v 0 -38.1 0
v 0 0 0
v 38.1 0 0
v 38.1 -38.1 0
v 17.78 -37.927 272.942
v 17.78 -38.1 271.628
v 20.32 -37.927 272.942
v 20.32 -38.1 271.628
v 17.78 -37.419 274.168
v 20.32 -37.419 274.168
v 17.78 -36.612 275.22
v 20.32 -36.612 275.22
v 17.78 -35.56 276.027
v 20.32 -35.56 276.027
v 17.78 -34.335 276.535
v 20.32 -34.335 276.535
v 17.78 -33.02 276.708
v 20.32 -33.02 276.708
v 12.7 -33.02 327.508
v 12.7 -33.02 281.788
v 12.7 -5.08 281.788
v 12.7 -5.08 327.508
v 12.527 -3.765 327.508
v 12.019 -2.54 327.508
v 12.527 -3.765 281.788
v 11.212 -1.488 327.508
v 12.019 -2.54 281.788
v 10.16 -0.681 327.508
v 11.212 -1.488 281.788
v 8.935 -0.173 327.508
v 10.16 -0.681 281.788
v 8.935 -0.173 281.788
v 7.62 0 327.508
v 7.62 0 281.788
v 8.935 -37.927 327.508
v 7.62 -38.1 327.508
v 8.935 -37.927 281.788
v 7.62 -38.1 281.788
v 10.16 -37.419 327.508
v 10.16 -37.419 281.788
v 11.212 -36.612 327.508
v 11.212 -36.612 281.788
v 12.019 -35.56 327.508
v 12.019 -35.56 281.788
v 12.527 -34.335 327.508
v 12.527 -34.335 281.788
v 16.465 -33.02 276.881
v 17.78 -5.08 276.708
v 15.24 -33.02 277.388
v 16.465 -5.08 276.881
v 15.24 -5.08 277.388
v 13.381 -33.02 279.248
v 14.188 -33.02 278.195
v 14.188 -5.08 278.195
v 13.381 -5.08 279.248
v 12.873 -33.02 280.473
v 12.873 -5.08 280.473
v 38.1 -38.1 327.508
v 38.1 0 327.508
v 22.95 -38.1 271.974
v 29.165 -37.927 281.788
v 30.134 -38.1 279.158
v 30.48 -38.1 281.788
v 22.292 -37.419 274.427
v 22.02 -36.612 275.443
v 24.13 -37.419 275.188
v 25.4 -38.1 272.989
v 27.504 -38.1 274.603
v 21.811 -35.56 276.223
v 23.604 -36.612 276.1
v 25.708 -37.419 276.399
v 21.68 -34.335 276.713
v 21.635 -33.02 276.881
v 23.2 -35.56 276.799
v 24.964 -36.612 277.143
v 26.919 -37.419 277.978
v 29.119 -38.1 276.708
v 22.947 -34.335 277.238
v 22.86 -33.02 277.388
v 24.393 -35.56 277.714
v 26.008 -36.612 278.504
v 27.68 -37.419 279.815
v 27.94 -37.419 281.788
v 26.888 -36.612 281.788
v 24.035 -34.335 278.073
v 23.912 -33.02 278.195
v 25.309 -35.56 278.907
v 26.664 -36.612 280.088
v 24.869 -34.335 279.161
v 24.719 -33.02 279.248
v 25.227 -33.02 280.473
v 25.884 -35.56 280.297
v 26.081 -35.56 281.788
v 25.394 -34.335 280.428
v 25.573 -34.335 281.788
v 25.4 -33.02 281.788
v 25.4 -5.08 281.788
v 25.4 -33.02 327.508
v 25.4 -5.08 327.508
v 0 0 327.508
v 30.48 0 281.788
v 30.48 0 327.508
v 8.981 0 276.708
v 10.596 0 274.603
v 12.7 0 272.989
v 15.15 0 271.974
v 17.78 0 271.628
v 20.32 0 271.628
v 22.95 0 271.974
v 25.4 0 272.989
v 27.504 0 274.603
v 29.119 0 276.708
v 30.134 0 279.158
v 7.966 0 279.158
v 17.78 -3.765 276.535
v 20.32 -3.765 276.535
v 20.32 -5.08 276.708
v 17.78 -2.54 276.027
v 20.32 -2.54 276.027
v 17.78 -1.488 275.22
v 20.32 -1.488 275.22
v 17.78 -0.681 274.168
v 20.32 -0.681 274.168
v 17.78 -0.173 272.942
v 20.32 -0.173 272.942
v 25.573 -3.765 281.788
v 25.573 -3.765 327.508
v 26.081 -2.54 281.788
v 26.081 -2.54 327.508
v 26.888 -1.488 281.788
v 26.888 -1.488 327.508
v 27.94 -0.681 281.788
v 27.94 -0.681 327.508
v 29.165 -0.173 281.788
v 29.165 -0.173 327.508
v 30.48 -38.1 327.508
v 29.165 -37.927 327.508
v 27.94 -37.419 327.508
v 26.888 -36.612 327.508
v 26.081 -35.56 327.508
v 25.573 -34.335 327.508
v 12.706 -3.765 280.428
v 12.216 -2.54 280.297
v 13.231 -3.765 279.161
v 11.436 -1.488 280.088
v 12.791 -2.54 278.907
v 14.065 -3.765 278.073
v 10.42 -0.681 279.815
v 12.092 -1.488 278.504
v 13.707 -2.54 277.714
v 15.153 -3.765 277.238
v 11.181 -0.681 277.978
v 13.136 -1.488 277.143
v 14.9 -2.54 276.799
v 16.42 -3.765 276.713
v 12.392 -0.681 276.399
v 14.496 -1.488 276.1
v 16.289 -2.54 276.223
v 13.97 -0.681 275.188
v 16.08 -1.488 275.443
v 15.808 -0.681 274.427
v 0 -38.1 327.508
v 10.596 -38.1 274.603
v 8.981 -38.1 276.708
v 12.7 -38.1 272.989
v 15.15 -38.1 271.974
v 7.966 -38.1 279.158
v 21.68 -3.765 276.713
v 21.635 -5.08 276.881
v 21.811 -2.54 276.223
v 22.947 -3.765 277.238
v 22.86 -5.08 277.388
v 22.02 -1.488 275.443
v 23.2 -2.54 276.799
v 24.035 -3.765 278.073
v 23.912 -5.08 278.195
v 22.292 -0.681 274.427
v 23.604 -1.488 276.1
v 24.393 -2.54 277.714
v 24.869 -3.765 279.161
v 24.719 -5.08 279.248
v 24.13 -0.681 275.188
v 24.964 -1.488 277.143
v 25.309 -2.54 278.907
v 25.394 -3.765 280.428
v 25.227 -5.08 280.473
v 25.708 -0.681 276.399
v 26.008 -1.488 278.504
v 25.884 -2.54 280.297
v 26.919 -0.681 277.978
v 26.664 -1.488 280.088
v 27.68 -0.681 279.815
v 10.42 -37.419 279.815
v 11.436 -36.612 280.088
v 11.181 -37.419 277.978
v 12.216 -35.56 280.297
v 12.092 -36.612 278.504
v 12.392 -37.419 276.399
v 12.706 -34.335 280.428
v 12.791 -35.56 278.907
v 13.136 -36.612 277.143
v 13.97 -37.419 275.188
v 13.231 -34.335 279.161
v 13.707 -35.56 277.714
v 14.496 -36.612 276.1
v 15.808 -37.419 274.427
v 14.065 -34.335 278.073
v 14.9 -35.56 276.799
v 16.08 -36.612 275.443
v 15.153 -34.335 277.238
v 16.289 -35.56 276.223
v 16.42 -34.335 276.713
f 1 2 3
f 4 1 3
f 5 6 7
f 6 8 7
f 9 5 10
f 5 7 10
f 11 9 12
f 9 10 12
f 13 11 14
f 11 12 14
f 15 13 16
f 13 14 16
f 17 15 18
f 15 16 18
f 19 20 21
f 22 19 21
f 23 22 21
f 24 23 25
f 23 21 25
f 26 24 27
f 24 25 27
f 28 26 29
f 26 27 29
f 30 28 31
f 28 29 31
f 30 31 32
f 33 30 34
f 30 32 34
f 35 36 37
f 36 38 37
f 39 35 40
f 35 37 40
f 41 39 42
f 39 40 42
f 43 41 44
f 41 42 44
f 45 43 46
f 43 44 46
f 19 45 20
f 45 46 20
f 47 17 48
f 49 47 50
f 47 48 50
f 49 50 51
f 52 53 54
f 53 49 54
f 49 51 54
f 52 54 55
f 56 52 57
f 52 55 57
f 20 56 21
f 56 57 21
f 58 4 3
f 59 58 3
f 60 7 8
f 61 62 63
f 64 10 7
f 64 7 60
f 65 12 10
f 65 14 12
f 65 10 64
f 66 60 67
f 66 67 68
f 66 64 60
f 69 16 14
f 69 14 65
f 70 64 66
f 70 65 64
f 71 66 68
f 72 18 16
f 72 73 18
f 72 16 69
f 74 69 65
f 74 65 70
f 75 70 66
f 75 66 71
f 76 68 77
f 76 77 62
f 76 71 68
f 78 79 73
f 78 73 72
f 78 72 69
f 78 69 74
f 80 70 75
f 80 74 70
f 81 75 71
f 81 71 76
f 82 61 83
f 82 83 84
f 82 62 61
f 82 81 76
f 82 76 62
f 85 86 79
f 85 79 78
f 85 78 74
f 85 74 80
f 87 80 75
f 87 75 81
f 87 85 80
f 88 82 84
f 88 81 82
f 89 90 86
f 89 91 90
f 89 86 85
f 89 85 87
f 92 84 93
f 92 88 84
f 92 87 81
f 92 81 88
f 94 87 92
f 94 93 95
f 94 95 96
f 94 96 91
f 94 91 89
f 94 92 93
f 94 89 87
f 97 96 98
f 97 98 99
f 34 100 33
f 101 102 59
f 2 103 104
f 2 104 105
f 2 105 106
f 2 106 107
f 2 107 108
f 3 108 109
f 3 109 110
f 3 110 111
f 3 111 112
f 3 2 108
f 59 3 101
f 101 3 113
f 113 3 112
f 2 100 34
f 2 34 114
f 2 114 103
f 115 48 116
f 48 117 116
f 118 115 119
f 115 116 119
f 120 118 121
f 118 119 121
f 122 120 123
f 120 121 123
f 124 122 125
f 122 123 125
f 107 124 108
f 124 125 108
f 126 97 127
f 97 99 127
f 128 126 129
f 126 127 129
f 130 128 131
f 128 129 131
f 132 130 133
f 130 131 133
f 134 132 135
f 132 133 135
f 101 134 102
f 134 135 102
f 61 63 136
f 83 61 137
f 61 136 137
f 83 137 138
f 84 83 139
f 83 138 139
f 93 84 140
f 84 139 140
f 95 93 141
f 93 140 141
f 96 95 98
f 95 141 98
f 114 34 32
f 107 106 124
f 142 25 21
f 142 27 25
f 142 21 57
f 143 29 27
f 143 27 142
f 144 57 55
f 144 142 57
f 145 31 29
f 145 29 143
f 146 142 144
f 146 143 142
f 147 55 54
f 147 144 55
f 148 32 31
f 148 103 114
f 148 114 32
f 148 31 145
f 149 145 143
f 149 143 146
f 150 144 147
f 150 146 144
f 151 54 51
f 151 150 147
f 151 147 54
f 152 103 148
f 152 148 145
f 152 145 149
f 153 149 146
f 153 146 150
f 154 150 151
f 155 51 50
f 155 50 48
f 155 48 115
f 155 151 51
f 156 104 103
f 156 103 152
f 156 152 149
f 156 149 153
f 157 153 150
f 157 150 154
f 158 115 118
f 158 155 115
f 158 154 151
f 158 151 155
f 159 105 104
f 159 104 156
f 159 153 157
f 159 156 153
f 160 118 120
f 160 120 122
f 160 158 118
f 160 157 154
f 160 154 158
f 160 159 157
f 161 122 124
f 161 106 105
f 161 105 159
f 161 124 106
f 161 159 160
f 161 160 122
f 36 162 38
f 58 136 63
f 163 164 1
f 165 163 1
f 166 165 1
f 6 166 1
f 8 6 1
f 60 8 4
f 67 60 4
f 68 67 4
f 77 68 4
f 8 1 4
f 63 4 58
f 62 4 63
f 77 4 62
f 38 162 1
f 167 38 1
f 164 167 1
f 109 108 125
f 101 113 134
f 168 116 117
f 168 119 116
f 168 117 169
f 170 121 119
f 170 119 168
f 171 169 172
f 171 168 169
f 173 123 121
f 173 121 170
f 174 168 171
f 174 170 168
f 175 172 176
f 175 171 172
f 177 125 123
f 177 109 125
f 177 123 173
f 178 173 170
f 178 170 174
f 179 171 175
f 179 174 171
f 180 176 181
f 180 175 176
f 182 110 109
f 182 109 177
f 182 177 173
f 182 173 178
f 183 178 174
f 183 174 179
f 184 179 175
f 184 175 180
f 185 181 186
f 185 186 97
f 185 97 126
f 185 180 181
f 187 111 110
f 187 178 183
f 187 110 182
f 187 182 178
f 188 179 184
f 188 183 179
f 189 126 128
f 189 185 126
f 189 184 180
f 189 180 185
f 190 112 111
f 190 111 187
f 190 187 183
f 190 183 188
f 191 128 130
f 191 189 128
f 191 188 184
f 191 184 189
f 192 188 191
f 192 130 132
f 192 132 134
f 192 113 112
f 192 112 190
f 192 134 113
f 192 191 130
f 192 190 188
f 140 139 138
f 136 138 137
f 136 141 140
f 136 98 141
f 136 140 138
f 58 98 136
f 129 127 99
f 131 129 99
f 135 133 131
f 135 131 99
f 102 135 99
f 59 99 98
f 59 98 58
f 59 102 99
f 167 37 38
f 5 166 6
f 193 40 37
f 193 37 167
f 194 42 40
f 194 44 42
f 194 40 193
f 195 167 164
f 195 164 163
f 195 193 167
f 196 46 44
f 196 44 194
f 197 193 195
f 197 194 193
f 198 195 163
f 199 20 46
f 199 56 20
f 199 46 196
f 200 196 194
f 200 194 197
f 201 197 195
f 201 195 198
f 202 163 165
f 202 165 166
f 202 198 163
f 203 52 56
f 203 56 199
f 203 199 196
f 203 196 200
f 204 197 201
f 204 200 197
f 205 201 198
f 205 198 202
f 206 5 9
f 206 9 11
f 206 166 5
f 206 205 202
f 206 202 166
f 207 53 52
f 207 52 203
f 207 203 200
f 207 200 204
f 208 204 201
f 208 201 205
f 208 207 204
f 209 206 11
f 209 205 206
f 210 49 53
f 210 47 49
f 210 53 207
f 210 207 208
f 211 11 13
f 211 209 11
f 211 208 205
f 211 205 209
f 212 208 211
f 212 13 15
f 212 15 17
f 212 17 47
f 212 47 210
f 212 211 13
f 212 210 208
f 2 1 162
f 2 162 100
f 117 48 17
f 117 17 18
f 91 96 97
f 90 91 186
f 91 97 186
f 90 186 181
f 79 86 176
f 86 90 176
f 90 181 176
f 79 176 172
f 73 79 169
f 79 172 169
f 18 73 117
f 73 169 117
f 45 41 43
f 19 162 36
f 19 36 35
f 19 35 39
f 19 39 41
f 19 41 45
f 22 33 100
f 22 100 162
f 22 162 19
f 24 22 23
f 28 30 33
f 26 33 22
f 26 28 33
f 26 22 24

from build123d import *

# Parameters (mm, degrees)
F0_W     = 38.1
F0_H     = 38.1
F1_DEPTH = 327.5076
F2_W     = 12.7
F2_H     = 38.1
F3_DEPTH = 50.8
F4_F1_R  = 5.08
F4_F2_R  = 5.08


with BuildPart() as f1:
    # F0 (on Top) → F1 (new body)
    with BuildSketch(Plane.XY):
        with Locations((19.05, -19.05)):
            Rectangle(F0_W, F0_H)
    extrude(amount=F1_DEPTH)

    # F2 (on face) → F3 (cut)
    with BuildSketch(Plane.XY.offset(327.5076)):
        with Locations((19.05, -19.05)):
            Rectangle(F2_W, F2_H)
    extrude(amount=-F3_DEPTH, mode=Mode.SUBTRACT)

    # F4: fillet of radius 5.08 on 4 edges, made by hand

    # F4_f1
    f4_f1_edges = [f1.edges().sort_by_distance(p)[0] for p in [
        (12.7, -19.05, 276.7076),
        (25.4, -19.05, 276.7076),
    ]]
    fillet(f4_f1_edges, radius=F4_F1_R)

    # F4_f2
    f4_f2_edges = [f1.edges().sort_by_distance(p)[0] for p in [
        (19.05, 0, 276.7076),
        (19.05, -38.1, 276.7076),
        (14.1878975516, -38.1, 278.1954975516),
        (23.9121024484, -38.1, 278.1954975516),
        (23.9121024484, 0, 278.1954975516),
        (14.1878975516, 0, 278.1954975516),
    ]]
    fillet(f4_f2_edges, radius=F4_F2_R)


solid = f1.part
